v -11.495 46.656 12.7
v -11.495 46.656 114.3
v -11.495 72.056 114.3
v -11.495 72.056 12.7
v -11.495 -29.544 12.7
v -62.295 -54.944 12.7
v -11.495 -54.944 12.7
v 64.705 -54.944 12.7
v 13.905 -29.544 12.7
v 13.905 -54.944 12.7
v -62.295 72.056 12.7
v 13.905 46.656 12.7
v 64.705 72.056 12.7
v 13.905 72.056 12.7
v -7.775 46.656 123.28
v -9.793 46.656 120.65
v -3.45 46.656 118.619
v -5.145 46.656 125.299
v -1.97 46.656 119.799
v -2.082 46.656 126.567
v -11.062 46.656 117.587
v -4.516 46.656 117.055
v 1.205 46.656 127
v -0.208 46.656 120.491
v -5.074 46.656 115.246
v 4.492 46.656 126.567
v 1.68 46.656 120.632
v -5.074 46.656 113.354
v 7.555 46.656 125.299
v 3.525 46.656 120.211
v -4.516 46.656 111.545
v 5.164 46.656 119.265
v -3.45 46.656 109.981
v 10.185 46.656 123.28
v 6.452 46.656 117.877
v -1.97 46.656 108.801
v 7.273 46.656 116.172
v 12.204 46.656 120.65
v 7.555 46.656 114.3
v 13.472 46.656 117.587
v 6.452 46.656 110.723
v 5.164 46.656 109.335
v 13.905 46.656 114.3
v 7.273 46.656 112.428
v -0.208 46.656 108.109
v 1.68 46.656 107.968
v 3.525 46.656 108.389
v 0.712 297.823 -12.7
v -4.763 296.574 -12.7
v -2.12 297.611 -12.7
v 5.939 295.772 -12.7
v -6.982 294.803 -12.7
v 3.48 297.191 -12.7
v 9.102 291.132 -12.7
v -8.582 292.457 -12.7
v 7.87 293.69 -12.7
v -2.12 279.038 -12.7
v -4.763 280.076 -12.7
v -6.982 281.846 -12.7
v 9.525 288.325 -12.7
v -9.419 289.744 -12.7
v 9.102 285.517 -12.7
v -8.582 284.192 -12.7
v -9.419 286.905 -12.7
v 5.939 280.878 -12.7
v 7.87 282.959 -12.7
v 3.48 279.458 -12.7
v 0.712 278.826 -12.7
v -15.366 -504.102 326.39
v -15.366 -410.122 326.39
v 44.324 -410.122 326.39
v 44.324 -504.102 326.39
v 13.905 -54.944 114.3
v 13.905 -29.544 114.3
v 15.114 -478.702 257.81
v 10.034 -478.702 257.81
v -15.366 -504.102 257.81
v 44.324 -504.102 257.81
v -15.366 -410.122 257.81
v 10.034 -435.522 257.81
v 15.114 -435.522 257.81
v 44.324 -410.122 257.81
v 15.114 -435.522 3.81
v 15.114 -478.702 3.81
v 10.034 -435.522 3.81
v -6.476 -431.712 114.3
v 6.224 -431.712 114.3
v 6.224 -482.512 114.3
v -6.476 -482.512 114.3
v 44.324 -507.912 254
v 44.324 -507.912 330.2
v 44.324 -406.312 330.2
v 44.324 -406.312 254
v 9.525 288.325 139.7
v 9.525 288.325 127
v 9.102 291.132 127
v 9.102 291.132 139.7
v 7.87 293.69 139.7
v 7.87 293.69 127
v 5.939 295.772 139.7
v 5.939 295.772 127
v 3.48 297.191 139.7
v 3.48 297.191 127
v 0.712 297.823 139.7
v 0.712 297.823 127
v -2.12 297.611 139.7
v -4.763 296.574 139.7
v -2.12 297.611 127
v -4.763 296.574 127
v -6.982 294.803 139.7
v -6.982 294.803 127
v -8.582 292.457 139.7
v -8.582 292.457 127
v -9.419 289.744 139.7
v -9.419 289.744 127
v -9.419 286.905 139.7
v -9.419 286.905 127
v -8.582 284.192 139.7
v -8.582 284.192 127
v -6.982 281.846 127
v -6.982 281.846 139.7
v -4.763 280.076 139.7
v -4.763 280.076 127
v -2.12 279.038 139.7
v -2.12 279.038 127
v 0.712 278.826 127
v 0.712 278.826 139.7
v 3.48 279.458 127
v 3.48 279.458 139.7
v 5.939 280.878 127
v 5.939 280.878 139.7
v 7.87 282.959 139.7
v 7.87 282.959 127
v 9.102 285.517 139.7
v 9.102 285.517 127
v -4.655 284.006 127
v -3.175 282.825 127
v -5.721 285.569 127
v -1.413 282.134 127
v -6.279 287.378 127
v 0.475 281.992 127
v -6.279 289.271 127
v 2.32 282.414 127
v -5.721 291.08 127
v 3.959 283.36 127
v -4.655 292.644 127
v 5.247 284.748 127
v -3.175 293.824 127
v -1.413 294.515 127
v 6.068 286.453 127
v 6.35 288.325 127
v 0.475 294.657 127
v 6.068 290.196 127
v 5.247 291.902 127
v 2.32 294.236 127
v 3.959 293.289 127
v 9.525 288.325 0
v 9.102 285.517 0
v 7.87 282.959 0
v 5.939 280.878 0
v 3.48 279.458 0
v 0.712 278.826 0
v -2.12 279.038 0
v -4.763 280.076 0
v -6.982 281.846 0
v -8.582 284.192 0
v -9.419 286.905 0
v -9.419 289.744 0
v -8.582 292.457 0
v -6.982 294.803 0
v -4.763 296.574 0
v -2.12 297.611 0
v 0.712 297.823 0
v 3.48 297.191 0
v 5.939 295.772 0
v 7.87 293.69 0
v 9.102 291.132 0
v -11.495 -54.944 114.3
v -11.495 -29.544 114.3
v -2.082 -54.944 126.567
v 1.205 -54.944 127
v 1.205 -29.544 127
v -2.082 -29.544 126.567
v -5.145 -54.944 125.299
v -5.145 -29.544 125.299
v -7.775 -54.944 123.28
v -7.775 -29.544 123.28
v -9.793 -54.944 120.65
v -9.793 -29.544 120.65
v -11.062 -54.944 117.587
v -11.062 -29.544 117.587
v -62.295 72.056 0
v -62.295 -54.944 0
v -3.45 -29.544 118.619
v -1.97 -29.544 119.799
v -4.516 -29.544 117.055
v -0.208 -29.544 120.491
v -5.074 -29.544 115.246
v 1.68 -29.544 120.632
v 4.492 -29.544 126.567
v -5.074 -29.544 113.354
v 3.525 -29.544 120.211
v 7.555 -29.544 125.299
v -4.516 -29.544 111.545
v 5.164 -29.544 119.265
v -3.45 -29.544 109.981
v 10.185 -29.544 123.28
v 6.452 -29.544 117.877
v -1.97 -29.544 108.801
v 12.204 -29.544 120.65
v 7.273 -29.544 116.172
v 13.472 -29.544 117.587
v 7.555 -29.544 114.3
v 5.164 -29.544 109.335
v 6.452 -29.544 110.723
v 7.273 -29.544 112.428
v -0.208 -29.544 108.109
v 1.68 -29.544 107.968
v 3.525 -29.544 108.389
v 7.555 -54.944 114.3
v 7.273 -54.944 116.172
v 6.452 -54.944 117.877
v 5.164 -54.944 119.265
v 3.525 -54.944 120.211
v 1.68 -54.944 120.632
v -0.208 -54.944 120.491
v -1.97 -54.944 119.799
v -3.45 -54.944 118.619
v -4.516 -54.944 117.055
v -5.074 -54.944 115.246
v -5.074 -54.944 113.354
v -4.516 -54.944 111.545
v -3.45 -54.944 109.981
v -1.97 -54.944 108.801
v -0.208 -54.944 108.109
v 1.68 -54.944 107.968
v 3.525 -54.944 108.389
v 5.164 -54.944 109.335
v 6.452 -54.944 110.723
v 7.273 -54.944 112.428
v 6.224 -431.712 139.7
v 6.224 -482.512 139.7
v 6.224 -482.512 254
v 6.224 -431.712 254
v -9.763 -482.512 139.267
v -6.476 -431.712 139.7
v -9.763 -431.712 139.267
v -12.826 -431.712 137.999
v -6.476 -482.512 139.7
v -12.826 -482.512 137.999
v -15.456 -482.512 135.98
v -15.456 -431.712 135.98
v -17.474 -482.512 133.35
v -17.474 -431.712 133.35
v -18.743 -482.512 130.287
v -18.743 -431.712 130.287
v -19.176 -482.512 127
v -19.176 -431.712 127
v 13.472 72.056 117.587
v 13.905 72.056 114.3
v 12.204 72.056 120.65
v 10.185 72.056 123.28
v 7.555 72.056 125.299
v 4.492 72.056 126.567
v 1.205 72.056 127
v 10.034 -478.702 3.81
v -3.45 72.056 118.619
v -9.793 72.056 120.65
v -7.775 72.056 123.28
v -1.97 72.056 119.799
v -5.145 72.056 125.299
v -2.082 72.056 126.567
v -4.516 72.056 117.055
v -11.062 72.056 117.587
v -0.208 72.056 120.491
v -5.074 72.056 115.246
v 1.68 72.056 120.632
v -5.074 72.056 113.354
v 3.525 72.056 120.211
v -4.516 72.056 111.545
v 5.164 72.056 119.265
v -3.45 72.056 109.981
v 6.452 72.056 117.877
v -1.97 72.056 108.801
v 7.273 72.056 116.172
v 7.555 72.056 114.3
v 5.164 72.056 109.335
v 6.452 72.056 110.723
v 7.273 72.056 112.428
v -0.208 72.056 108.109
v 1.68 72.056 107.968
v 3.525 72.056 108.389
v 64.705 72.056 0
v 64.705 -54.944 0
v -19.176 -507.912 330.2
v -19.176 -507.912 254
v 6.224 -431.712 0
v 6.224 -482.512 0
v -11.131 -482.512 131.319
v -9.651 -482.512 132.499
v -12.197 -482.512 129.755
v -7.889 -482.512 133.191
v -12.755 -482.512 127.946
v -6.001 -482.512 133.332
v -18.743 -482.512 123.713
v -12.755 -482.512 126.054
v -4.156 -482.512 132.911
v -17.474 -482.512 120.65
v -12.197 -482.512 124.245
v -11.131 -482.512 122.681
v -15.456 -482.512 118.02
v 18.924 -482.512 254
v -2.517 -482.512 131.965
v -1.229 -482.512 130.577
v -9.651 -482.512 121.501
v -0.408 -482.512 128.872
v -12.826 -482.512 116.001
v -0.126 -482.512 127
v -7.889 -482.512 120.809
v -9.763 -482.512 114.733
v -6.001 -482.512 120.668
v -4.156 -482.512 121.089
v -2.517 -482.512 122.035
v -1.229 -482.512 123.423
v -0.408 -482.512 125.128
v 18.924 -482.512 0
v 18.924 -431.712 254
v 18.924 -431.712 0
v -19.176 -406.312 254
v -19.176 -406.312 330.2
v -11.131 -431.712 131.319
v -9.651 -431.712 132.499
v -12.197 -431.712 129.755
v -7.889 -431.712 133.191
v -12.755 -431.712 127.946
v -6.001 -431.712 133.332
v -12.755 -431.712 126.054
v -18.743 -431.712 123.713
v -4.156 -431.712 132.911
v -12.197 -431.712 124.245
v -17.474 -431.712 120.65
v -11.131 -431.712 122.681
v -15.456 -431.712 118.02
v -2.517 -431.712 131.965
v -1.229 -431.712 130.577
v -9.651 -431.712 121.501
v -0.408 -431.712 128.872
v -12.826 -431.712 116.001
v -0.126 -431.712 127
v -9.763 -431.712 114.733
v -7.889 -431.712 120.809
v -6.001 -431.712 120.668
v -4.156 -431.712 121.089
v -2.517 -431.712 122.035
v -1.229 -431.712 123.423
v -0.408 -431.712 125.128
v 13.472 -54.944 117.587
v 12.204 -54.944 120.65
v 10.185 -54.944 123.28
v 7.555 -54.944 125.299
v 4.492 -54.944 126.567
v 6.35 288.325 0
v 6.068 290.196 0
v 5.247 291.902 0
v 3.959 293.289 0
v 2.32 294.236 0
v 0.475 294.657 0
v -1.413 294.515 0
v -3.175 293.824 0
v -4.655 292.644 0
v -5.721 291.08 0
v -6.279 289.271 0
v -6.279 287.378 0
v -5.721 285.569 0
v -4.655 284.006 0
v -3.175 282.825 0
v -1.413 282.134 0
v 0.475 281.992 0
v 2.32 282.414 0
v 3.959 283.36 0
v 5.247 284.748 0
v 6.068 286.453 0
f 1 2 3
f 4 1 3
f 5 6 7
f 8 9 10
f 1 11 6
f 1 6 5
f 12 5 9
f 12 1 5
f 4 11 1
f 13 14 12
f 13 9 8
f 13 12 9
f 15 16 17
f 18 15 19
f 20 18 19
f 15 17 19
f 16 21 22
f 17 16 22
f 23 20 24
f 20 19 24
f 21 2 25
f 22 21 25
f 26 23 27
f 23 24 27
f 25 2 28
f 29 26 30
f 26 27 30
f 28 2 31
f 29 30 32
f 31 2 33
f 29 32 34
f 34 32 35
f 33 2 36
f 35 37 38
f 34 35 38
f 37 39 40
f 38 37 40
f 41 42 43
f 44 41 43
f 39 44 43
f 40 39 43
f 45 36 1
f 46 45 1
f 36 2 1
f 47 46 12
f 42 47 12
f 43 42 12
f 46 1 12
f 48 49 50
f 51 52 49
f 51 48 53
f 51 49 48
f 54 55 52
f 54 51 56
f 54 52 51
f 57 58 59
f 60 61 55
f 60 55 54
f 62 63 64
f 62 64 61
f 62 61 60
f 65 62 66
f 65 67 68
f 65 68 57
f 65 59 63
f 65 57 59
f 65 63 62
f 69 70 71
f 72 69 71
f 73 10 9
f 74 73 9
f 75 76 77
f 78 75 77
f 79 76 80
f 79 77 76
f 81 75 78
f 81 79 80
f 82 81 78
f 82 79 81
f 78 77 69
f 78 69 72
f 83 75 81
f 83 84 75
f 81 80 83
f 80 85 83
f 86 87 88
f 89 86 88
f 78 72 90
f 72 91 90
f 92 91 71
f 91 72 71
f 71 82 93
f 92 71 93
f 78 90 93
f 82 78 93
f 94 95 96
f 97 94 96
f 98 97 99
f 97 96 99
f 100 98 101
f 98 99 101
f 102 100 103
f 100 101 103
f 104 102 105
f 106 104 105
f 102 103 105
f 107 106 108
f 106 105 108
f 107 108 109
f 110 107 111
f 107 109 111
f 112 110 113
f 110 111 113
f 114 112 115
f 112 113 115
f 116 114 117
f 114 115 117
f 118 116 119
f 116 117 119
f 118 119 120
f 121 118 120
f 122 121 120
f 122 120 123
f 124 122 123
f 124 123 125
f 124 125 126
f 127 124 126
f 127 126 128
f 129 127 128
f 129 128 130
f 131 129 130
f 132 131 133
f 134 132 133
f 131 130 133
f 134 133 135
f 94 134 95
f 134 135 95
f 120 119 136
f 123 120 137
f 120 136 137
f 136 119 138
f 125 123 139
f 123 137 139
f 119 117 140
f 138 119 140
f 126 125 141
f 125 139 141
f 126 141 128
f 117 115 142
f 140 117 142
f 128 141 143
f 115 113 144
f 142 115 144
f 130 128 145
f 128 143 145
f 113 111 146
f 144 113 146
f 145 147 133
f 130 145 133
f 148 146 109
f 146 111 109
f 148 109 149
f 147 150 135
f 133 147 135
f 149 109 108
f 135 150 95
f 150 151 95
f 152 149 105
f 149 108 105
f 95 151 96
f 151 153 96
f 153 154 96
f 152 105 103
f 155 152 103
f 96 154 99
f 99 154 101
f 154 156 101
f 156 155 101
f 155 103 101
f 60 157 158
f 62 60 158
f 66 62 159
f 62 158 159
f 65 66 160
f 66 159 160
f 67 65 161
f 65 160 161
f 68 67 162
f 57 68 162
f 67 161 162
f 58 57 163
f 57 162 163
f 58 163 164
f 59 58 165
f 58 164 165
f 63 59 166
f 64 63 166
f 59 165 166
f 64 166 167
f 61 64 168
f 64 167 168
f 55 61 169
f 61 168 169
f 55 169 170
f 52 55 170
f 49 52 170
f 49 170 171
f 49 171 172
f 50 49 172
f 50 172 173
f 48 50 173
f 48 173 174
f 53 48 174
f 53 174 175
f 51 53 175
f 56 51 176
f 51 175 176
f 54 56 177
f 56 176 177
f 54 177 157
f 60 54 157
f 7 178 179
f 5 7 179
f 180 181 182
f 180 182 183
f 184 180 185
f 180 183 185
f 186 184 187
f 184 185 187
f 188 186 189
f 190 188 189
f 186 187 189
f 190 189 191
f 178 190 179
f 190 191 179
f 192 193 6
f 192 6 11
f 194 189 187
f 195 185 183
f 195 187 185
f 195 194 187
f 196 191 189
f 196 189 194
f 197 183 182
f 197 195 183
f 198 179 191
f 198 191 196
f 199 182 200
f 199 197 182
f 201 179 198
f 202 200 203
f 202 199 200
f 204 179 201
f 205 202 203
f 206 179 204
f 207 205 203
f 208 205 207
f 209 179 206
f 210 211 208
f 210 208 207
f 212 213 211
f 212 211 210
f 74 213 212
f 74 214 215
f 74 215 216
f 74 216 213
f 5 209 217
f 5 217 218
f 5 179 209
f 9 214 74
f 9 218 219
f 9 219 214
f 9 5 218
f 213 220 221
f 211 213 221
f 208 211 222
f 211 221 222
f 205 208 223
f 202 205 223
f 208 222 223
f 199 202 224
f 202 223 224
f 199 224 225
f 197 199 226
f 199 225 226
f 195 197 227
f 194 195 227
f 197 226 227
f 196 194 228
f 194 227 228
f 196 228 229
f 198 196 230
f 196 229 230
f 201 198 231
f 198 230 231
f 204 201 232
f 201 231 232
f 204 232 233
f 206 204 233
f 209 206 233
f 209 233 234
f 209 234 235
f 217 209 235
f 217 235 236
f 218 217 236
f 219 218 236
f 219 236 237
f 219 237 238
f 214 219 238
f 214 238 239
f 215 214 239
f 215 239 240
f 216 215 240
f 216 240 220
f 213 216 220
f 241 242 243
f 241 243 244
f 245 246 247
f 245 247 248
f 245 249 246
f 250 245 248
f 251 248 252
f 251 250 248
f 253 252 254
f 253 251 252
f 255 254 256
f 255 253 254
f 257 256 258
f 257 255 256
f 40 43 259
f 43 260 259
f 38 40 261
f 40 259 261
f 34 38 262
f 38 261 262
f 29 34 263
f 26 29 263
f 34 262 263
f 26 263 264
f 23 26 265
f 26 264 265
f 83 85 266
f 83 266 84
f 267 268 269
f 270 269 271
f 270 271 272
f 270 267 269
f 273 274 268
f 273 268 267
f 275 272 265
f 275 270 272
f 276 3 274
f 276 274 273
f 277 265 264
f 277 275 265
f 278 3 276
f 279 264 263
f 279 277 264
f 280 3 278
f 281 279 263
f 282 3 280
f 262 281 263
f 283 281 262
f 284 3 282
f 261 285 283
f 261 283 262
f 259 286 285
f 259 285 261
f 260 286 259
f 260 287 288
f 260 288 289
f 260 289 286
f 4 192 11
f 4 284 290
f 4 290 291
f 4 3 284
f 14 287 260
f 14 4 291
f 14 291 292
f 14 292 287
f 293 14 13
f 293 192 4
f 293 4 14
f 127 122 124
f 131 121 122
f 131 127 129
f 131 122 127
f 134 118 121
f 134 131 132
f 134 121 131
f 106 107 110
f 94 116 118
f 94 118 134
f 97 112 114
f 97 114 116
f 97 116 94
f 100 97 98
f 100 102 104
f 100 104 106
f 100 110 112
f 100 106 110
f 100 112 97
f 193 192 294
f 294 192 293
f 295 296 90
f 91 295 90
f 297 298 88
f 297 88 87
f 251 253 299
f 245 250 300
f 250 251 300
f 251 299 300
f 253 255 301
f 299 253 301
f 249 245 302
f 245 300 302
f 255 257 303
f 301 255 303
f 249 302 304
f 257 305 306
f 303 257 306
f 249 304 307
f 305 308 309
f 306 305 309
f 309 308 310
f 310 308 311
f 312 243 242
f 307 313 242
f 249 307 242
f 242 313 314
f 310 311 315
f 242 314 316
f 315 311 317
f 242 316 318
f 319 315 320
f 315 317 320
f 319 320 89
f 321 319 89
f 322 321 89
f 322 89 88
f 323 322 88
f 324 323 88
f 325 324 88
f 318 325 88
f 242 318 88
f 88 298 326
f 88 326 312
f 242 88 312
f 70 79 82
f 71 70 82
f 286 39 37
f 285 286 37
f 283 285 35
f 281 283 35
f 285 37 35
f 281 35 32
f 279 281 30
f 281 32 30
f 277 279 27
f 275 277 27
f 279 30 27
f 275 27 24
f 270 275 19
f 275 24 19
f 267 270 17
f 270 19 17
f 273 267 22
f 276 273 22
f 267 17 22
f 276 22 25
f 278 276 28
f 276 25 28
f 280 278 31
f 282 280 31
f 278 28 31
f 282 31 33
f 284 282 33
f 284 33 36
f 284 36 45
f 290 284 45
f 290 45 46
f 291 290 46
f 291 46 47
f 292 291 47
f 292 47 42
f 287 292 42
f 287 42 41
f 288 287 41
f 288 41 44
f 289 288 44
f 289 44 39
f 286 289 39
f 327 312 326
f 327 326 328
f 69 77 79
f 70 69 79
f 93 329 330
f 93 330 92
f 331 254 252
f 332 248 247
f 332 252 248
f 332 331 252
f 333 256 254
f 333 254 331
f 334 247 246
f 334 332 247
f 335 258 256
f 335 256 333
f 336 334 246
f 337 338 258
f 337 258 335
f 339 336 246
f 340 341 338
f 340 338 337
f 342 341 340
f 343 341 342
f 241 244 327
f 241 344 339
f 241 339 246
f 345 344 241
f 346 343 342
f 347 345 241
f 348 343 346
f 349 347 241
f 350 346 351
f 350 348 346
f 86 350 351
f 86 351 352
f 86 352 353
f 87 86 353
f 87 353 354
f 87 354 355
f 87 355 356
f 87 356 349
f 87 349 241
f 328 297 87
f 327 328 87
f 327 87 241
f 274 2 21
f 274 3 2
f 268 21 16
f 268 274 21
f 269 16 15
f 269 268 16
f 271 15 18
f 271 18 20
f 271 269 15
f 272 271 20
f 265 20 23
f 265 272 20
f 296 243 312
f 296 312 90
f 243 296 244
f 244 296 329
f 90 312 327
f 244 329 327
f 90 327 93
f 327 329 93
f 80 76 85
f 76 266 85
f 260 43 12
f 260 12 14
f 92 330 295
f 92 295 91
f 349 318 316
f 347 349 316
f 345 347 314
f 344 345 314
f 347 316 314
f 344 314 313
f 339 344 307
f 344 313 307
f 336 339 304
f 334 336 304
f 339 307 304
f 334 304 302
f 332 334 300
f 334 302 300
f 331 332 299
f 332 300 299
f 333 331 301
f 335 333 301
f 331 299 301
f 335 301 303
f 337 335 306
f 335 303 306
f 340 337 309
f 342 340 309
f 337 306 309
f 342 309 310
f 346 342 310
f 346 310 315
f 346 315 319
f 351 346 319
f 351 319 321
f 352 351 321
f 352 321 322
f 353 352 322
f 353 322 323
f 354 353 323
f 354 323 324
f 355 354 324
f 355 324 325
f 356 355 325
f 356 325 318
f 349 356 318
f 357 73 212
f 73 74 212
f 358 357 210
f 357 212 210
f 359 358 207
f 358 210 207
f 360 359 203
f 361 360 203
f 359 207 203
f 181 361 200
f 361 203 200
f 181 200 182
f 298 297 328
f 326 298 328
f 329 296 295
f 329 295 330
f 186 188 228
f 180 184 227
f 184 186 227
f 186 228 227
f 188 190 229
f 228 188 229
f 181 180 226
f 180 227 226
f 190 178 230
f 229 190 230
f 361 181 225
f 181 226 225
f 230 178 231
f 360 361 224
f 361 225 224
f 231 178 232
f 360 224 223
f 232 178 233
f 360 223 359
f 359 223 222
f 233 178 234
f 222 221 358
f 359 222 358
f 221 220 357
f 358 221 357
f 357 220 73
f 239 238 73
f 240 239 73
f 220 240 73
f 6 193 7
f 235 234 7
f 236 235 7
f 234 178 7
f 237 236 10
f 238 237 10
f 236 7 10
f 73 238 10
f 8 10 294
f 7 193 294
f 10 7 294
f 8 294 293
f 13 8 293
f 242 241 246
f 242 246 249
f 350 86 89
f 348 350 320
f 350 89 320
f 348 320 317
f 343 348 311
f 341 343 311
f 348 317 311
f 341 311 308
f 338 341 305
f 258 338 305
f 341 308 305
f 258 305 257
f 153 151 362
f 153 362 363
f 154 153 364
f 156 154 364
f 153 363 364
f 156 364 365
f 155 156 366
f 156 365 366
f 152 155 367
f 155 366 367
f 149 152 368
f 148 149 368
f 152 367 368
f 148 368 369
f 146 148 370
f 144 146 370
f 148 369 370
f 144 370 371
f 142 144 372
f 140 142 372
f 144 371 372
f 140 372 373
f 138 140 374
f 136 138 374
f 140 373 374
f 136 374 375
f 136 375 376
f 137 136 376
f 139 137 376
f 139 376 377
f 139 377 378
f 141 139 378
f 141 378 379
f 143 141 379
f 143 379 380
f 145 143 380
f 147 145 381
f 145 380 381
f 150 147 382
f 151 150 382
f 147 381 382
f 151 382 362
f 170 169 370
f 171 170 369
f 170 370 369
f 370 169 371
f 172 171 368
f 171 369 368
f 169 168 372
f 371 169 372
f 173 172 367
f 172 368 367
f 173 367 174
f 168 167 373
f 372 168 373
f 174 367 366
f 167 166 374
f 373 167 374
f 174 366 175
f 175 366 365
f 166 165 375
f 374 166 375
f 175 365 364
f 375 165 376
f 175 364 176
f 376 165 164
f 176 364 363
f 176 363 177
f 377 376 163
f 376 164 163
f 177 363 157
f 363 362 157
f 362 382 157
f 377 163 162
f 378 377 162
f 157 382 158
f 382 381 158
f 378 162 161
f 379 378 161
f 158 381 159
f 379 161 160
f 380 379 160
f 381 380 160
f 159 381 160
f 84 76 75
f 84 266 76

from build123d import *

# Parameters (mm, degrees)
F0_W      = 127
F0_H      = 127
F1_DEPTH  = 12.7
F2_W      = 25.4
F2_H      = 25.4
F3_DEPTH  = 114.3
F4_R      = 12.7
F5_R      = 12.69999
F6_R      = 12.69999
F7_R      = 6.35
F8_DEPTH  = 153.416
F0_R      = 6.35
F9_DEPTH  = 127
F10_R     = 9.525
F11_DEPTH = 12.7
F12_R     = 9.525
F13_DEPTH = 12.7
F0_W_2    = 12.7
F0_H_2    = 50.8
F14_DEPTH = 254
F15_W     = 63.5
F15_H     = 101.6
F15_W_2   = 12.7
F15_H_2   = 50.8
F16_DEPTH = 76.2
F17_T     = -3.81
F18_W     = 50.8
F18_H     = 25.4
F19_DEPTH = 25.4
F20_R     = 12.69999
F21_R     = 6.35
F22_DEPTH = 80.01


# Not quite as in the source:
# - a fillet or chamfer is up to 0.001 mm smaller than in the source, because OpenCascade refuses the exact size


with BuildPart() as f1:
    # F0 (on Top) → F1 (new body)
    with BuildSketch(Plane.XY):
        with Locations((1.2050811201, 8.5559213668)):
            Rectangle(F0_W, F0_H)
    extrude(amount=F1_DEPTH)

    # F2 (on face) → F3 (join)
    with BuildSketch(Plane.XY.offset(12.7)):
        with Locations((1.2050811201, -42.2440786332)):
            Rectangle(F2_W, F2_H)
        with Locations((1.2050811201, 59.3559213668)):
            Rectangle(F2_W, F2_H)
    extrude(amount=F3_DEPTH)

    # F4
    f4_edges = [f1.edges().sort_by_distance(p)[0] for p in [
        (13.905081, -42.244079, 127),
    ]]
    fillet(f4_edges, radius=F4_R)

    # F5 (radius 12.7 in the source; OpenCascade refuses exactly that, so slightly less here)
    f5_edges = [f1.edges().sort_by_distance(p)[0] for p in [
        (-11.494919, -42.244079, 127),
    ]]
    fillet(f5_edges, radius=F5_R)

    # F6 (radius 12.7 in the source; OpenCascade refuses exactly that, so slightly less here)
    f6_edges = [f1.edges().sort_by_distance(p)[0] for p in [
        (-11.494919, 59.355921, 127),
        (13.905081, 59.355921, 127),
    ]]
    fillet(f6_edges, radius=F6_R)

    # F7 (on face) → F8 (cut)
    with BuildSketch(Plane.XZ.offset(54.9440786332)):
        with Locations((1.2050811201, 114.3)):
            Circle(F7_R)
    extrude(amount=-F8_DEPTH, mode=Mode.SUBTRACT)


with BuildPart() as f9:
    # F0 (on Top) → F9 (new body)
    with BuildSketch(Plane.XY):
        with Locations((0, 288.3246541023)):
            Circle(F0_R)
    extrude(amount=F9_DEPTH)

    # F10 (on face) → F11 (join)
    with BuildSketch(Plane.XY.offset(127)):
        with Locations((0, 288.3246541023)):
            Circle(F10_R)
    extrude(amount=F11_DEPTH)

    # F12 (on face) → F13 (join)
    with BuildSketch(Plane(origin=(0, 0, 0), x_dir=(1, 0, 0), z_dir=(0, 0, -1))):
        with Locations((0, -288.3246541023)):
            Circle(F12_R)
    extrude(amount=F13_DEPTH)


with BuildPart() as f14:
    # F0 (on Top) → F14 (new body)
    with BuildSketch(Plane.XY):
        with Locations((12.5742597342, -457.1122058392)):
            Rectangle(F0_W_2, F0_H_2)
    extrude(amount=F14_DEPTH)

    # F15 (on face) → F16 (join)
    with BuildSketch(Plane.XY.offset(254)):
        with Locations((12.5742597342, -457.1122058392)):
            Rectangle(F15_W, F15_H)
        with Locations((12.5742597342, -457.1122058392)):
            Rectangle(F15_W_2, F15_H_2, mode=Mode.SUBTRACT)
        with Locations((12.5742597342, -457.1122058392)):
            Rectangle(F15_W_2, F15_H_2)
    extrude(amount=F16_DEPTH)

    # F17
    f17_openings = [f14.faces().sort_by_distance(p)[0] for p in [
        (44.32426, -457.112206, 292.1),
    ]]
    offset(amount=F17_T, openings=f17_openings, kind=Kind.INTERSECTION)

    # F18 (on face) → F19 (join)
    with BuildSketch(Plane(origin=(6.2242597342, 0, 0), x_dir=(0, -1, 0), z_dir=(-1, 0, 0))):
        with Locations((457.1122058392, 127)):
            Rectangle(F18_W, F18_H)
    extrude(amount=F19_DEPTH)

    # F20 (radius 12.7 in the source; OpenCascade refuses exactly that, so slightly less here)
    f20_edges = [f14.edges().sort_by_distance(p)[0] for p in [
        (-19.17574, -457.112206, 114.3),
        (-19.17574, -457.112206, 139.7),
    ]]
    fillet(f20_edges, radius=F20_R)

    # F21 (on face) → F22 (cut)
    with BuildSketch(Plane.XZ.offset(482.5122058392)):
        with Locations((-6.4757402658, 127)):
            Circle(F21_R)
    extrude(amount=-F22_DEPTH, mode=Mode.SUBTRACT)


solid = Compound([f1.part, f9.part, f14.part])
